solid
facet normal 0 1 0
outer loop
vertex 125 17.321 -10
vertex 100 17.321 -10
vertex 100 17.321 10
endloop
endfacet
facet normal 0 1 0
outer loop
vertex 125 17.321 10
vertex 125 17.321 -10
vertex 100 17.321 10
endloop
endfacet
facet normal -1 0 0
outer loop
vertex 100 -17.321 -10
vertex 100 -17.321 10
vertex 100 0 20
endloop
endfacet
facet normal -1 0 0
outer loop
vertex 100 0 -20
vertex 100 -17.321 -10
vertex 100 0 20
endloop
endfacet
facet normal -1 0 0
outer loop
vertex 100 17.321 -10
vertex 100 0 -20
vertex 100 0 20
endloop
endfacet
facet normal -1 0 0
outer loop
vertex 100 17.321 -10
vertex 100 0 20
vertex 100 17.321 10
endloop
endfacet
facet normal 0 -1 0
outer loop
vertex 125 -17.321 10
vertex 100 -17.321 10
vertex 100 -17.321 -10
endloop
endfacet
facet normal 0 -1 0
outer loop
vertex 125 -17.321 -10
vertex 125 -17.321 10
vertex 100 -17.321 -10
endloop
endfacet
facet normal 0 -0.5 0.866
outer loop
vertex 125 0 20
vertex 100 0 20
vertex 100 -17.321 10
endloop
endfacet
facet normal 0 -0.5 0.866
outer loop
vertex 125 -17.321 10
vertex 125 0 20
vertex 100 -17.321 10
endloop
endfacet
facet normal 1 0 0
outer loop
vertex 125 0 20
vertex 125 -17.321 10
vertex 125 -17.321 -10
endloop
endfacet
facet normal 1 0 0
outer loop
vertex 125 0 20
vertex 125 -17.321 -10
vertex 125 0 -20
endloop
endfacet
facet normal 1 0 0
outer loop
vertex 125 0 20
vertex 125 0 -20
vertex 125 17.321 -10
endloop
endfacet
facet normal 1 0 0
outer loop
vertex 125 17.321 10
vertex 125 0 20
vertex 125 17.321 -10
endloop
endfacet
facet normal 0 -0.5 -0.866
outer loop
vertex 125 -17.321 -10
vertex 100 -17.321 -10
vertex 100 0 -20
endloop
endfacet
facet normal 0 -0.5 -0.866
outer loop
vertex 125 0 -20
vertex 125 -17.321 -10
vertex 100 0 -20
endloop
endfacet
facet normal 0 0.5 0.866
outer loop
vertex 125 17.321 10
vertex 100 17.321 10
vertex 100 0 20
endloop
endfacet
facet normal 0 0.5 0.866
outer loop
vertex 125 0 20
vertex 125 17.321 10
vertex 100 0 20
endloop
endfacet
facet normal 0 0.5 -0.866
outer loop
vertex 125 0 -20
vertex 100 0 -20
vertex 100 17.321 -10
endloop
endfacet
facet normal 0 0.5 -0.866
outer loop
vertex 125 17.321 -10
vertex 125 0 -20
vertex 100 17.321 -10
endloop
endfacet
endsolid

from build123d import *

# Parameters (mm, degrees)
F4_DEPTH = 25


# Not quite as in the source:
# - a feature of the source that left no trace in its solid (it failed there, or was rolled back) is left out
# - the program builds the solid bodies; features that only make, move or delete a surface that nothing else refers to are left out


with BuildPart() as f4:
    # F3 (on face) → F4 (new body)
    with BuildSketch(Plane.YZ.offset(100)):
        Polygon((17.3205080757, 10), (0, 20), (-17.3205080757, 10), (-17.3205080757, -10), (0, -20), (17.3205080757, -10), align=None)
    extrude(amount=F4_DEPTH)


solid = f4.part
